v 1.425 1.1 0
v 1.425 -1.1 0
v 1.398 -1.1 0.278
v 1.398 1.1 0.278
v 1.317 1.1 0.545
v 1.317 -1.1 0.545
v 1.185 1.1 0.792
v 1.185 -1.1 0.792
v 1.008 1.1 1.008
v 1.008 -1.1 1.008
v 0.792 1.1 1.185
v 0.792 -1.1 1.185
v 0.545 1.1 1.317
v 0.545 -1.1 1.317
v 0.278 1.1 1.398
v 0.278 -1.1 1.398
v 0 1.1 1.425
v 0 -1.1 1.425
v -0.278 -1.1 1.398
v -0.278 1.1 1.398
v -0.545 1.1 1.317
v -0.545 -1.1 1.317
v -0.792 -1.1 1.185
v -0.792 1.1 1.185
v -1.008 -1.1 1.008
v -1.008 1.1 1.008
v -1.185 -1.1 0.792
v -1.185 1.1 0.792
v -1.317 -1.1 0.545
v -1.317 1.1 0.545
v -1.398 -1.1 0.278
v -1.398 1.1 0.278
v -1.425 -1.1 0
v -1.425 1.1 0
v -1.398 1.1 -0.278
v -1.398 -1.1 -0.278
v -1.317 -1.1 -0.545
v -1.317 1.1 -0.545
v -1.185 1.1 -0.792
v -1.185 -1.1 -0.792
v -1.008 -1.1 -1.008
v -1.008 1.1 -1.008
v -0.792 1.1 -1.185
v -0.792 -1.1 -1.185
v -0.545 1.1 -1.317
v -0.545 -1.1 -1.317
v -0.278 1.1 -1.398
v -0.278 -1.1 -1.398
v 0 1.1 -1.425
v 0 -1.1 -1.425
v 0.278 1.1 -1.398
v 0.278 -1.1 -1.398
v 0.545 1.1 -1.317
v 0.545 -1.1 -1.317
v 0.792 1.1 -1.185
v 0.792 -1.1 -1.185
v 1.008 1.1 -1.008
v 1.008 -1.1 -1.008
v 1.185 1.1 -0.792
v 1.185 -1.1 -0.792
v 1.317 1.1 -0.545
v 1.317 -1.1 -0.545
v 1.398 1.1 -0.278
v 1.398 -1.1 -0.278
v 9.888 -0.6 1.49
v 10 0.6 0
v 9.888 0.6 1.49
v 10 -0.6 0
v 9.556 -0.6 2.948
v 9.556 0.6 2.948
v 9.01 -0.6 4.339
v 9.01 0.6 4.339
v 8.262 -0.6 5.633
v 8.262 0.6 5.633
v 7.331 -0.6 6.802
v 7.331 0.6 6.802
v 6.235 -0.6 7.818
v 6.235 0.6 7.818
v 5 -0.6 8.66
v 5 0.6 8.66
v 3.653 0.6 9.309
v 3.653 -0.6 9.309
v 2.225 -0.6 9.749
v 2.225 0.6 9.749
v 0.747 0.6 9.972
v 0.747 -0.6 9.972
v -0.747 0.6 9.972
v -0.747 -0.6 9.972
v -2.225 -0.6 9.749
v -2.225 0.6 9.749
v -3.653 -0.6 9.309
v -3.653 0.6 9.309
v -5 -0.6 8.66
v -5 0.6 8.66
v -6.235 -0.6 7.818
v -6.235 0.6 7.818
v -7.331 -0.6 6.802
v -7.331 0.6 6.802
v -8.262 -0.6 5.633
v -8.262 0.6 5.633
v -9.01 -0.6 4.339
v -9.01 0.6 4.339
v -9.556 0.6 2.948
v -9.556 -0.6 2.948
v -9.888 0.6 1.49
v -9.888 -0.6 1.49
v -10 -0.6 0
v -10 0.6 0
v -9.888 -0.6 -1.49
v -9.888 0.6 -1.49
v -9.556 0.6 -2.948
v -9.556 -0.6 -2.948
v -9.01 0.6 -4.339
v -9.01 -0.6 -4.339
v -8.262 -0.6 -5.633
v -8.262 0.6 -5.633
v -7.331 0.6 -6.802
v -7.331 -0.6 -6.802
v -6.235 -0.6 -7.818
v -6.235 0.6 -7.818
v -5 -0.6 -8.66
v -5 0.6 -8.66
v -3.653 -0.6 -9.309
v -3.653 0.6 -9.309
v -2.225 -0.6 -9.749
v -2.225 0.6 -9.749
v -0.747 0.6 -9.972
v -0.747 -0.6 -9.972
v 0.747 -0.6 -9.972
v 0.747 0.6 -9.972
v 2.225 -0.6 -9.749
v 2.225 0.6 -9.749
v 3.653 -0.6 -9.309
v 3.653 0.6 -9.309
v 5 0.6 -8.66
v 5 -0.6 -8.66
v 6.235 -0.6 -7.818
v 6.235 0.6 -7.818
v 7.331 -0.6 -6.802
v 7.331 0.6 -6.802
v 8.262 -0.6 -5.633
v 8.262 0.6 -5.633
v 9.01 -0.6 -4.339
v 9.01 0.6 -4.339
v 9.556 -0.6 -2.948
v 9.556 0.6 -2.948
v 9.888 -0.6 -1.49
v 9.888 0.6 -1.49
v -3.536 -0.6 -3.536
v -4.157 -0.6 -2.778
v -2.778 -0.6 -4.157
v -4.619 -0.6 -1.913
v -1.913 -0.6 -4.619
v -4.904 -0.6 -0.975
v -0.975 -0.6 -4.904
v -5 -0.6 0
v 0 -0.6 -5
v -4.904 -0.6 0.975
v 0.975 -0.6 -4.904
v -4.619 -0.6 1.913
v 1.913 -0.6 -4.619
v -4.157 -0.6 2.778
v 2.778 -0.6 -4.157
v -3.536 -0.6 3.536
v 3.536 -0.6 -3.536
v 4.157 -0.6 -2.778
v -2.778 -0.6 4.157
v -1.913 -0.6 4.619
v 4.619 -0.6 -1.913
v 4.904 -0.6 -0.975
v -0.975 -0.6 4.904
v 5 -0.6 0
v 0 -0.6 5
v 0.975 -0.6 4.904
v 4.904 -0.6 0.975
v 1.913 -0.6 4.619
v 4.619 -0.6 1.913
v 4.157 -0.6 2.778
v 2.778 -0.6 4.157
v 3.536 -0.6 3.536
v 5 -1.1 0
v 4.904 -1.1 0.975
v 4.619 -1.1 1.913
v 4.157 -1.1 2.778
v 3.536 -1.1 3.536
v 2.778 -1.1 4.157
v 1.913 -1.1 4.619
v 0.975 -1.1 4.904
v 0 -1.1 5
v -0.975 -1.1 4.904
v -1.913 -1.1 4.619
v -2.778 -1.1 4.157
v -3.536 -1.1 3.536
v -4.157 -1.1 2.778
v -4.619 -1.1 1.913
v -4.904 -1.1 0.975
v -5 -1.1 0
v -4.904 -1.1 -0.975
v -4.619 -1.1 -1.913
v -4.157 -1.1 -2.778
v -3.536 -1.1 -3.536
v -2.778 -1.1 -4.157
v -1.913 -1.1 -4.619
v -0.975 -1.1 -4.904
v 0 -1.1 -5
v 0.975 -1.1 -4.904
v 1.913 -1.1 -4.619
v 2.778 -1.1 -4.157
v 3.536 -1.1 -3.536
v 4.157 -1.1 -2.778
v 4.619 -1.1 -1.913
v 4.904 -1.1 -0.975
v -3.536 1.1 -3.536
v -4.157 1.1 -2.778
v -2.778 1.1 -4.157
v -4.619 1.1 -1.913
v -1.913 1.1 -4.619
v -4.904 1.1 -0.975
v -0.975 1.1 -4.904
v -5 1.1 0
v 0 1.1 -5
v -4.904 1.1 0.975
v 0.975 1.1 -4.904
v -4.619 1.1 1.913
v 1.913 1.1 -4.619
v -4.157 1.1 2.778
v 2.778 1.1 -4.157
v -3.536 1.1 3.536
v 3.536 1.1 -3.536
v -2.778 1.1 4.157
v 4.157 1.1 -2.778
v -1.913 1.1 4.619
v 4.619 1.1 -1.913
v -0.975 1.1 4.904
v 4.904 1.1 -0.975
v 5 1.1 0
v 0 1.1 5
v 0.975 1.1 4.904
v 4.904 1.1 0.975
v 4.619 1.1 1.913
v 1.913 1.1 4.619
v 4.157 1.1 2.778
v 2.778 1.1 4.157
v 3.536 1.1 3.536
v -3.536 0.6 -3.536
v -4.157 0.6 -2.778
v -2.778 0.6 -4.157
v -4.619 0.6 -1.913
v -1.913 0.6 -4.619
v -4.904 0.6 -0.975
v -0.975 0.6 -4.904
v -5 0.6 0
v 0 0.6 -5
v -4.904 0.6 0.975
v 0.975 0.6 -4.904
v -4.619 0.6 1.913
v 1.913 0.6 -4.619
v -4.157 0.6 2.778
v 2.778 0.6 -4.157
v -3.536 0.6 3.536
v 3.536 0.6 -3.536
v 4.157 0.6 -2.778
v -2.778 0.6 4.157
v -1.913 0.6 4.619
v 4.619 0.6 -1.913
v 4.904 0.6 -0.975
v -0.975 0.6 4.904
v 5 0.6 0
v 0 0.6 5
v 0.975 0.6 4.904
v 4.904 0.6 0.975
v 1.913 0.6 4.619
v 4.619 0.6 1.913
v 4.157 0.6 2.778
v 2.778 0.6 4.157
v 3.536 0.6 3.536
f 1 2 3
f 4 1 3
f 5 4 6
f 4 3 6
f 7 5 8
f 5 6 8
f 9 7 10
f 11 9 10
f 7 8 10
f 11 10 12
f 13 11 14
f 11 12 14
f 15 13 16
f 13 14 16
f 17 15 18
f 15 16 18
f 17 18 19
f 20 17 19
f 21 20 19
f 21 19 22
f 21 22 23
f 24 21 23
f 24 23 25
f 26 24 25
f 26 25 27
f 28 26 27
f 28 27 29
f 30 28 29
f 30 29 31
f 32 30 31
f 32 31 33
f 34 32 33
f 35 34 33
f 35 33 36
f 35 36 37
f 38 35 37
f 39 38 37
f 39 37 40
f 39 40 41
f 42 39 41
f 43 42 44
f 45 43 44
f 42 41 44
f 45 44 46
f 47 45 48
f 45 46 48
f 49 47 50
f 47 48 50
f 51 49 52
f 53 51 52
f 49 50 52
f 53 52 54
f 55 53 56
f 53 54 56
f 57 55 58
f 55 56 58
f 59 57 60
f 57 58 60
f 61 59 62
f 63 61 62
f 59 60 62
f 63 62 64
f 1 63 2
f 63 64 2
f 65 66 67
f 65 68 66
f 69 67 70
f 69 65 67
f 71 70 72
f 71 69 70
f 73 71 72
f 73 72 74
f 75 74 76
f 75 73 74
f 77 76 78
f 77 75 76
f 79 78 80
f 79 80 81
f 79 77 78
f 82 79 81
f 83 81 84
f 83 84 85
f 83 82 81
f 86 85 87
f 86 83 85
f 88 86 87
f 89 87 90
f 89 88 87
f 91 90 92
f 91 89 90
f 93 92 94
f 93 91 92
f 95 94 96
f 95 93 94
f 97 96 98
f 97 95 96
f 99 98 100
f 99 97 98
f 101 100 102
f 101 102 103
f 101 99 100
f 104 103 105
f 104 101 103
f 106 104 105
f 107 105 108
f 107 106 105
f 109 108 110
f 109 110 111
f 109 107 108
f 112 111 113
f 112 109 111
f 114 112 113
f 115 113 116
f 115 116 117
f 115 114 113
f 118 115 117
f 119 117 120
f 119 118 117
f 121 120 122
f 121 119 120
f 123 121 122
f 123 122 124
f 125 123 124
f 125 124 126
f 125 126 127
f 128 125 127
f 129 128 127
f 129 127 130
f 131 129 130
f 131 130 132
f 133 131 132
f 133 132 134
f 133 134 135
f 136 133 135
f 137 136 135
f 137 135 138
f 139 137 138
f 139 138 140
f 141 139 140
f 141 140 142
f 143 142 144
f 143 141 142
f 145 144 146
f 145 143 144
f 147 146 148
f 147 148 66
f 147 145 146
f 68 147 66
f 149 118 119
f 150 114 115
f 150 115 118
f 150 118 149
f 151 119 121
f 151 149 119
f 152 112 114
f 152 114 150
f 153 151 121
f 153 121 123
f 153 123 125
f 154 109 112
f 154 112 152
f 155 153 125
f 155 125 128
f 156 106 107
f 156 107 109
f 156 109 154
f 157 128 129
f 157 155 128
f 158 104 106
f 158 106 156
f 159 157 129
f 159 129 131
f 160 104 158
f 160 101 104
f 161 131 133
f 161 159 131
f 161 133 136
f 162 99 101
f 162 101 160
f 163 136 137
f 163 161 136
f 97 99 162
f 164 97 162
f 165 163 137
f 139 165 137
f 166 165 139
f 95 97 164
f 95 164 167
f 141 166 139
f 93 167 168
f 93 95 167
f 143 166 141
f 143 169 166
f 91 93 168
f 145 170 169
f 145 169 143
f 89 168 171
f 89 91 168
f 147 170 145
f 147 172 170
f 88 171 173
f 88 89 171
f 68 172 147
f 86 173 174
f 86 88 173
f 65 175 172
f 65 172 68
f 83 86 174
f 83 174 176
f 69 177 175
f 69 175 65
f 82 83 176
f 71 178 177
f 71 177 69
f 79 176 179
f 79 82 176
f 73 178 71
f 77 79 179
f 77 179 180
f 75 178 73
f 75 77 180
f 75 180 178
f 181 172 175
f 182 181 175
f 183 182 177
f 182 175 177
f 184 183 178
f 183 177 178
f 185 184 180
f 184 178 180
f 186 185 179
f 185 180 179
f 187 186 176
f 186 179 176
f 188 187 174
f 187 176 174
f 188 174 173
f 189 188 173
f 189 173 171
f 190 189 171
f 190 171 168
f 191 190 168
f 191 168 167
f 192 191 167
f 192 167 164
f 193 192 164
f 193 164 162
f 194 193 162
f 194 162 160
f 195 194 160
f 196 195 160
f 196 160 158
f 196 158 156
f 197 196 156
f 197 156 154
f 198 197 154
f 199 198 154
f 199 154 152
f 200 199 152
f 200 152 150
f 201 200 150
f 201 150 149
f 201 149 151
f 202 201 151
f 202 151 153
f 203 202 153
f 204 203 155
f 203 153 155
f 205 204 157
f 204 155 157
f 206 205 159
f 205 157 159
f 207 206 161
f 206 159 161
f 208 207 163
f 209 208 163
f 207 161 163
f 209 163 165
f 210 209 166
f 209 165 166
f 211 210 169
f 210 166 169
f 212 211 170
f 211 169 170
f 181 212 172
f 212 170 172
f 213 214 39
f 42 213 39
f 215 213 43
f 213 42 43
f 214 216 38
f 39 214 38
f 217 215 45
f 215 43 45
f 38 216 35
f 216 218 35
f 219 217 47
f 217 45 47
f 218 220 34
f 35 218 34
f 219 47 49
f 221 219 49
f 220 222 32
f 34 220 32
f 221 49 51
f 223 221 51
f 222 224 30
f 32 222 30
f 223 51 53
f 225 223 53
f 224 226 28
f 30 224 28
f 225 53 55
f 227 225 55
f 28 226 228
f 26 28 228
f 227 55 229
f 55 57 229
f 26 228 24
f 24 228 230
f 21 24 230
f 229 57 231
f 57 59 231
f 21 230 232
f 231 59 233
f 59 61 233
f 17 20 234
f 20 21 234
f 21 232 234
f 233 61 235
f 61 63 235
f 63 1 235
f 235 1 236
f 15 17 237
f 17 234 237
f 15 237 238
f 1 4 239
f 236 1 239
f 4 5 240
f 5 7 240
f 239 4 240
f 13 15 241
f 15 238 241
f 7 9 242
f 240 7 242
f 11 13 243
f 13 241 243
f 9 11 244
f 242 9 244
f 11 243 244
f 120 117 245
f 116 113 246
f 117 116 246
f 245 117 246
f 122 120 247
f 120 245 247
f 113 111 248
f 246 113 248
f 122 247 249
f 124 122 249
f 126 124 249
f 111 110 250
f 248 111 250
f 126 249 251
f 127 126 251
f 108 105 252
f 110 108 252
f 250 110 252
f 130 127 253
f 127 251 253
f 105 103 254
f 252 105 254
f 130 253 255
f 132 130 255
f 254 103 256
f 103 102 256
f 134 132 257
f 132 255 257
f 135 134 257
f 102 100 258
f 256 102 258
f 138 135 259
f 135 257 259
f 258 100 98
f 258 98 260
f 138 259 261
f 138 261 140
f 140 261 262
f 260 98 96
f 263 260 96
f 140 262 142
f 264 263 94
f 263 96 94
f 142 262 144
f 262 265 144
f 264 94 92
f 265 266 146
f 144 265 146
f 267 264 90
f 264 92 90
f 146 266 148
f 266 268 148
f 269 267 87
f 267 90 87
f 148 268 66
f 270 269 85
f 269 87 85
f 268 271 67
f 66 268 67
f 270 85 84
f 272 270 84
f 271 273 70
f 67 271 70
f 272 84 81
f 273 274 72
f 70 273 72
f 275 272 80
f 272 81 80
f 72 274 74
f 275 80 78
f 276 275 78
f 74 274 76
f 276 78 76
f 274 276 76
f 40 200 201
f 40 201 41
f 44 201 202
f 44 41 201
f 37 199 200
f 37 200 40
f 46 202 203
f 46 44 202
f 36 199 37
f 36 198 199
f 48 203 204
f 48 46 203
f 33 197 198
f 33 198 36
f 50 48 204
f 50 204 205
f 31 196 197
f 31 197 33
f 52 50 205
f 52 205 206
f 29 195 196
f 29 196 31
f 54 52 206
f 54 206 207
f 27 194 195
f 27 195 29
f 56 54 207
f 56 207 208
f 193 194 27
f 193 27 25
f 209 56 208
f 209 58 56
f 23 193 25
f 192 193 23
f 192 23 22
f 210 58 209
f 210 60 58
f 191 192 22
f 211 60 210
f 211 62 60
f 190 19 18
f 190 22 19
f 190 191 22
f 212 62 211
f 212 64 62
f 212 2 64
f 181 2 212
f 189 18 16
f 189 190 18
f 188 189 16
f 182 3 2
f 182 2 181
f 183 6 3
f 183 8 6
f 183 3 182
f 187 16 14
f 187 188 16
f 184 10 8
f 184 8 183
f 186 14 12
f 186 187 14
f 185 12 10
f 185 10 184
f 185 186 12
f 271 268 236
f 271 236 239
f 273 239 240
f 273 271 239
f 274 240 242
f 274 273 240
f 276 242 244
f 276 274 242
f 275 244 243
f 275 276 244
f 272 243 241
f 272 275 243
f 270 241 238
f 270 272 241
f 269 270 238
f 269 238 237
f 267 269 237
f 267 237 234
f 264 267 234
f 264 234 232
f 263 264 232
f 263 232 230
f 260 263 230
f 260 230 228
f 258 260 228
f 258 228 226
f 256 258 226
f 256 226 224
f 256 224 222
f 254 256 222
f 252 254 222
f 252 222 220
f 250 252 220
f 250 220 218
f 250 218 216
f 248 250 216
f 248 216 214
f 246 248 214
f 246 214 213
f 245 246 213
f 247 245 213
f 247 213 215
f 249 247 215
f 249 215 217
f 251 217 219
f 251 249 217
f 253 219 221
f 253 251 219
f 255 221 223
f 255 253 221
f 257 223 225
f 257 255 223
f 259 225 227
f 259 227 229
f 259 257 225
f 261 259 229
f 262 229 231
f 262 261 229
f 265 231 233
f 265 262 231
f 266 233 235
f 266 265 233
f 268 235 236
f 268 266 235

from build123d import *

# Parameters (mm, degrees)
F0_R     = 5
F1_DEPTH = 1.1
F0_R_2   = 10
F2_DEPTH = 0.6
F3_DEPTH = 0.6
F4_DEPTH = 1.1
F7_D     = 2.85
F7_DEPTH = 2.5
F7_TIP   = 0.8562263821


with BuildPart() as f1:
    # F0 (on Front) → F1 (new body)
    with BuildSketch(Plane.XZ):
        Circle(F0_R)
    extrude(amount=F1_DEPTH)

    # F0 (on Front) → F2 (join)
    with BuildSketch(Plane.XZ):
        Circle(F0_R_2)
        Circle(F0_R, mode=Mode.SUBTRACT)
    extrude(amount=F2_DEPTH)

    # F0 (on Front) → F3 (join)
    with BuildSketch(Plane.XZ):
        Circle(F0_R_2)
        Circle(F0_R, mode=Mode.SUBTRACT)
    extrude(amount=-F3_DEPTH)

    # F0 (on Front) → F4 (join)
    with BuildSketch(Plane.XZ):
        Circle(F0_R)
    extrude(amount=-F4_DEPTH)

    # F7
    with Locations(Plane(origin=(0, 1.1, 0), x_dir=(-1, 0, 0), z_dir=(0, 1, 0))):
        with Locations((0, 0)):
            Hole(F7_D / 2, depth=F7_DEPTH)
            with Locations((0, 0, -(F7_DEPTH + F7_TIP / 2))):  # 118° drill point
                Cone(0, F7_D / 2, F7_TIP, mode=Mode.SUBTRACT)


solid = f1.part
